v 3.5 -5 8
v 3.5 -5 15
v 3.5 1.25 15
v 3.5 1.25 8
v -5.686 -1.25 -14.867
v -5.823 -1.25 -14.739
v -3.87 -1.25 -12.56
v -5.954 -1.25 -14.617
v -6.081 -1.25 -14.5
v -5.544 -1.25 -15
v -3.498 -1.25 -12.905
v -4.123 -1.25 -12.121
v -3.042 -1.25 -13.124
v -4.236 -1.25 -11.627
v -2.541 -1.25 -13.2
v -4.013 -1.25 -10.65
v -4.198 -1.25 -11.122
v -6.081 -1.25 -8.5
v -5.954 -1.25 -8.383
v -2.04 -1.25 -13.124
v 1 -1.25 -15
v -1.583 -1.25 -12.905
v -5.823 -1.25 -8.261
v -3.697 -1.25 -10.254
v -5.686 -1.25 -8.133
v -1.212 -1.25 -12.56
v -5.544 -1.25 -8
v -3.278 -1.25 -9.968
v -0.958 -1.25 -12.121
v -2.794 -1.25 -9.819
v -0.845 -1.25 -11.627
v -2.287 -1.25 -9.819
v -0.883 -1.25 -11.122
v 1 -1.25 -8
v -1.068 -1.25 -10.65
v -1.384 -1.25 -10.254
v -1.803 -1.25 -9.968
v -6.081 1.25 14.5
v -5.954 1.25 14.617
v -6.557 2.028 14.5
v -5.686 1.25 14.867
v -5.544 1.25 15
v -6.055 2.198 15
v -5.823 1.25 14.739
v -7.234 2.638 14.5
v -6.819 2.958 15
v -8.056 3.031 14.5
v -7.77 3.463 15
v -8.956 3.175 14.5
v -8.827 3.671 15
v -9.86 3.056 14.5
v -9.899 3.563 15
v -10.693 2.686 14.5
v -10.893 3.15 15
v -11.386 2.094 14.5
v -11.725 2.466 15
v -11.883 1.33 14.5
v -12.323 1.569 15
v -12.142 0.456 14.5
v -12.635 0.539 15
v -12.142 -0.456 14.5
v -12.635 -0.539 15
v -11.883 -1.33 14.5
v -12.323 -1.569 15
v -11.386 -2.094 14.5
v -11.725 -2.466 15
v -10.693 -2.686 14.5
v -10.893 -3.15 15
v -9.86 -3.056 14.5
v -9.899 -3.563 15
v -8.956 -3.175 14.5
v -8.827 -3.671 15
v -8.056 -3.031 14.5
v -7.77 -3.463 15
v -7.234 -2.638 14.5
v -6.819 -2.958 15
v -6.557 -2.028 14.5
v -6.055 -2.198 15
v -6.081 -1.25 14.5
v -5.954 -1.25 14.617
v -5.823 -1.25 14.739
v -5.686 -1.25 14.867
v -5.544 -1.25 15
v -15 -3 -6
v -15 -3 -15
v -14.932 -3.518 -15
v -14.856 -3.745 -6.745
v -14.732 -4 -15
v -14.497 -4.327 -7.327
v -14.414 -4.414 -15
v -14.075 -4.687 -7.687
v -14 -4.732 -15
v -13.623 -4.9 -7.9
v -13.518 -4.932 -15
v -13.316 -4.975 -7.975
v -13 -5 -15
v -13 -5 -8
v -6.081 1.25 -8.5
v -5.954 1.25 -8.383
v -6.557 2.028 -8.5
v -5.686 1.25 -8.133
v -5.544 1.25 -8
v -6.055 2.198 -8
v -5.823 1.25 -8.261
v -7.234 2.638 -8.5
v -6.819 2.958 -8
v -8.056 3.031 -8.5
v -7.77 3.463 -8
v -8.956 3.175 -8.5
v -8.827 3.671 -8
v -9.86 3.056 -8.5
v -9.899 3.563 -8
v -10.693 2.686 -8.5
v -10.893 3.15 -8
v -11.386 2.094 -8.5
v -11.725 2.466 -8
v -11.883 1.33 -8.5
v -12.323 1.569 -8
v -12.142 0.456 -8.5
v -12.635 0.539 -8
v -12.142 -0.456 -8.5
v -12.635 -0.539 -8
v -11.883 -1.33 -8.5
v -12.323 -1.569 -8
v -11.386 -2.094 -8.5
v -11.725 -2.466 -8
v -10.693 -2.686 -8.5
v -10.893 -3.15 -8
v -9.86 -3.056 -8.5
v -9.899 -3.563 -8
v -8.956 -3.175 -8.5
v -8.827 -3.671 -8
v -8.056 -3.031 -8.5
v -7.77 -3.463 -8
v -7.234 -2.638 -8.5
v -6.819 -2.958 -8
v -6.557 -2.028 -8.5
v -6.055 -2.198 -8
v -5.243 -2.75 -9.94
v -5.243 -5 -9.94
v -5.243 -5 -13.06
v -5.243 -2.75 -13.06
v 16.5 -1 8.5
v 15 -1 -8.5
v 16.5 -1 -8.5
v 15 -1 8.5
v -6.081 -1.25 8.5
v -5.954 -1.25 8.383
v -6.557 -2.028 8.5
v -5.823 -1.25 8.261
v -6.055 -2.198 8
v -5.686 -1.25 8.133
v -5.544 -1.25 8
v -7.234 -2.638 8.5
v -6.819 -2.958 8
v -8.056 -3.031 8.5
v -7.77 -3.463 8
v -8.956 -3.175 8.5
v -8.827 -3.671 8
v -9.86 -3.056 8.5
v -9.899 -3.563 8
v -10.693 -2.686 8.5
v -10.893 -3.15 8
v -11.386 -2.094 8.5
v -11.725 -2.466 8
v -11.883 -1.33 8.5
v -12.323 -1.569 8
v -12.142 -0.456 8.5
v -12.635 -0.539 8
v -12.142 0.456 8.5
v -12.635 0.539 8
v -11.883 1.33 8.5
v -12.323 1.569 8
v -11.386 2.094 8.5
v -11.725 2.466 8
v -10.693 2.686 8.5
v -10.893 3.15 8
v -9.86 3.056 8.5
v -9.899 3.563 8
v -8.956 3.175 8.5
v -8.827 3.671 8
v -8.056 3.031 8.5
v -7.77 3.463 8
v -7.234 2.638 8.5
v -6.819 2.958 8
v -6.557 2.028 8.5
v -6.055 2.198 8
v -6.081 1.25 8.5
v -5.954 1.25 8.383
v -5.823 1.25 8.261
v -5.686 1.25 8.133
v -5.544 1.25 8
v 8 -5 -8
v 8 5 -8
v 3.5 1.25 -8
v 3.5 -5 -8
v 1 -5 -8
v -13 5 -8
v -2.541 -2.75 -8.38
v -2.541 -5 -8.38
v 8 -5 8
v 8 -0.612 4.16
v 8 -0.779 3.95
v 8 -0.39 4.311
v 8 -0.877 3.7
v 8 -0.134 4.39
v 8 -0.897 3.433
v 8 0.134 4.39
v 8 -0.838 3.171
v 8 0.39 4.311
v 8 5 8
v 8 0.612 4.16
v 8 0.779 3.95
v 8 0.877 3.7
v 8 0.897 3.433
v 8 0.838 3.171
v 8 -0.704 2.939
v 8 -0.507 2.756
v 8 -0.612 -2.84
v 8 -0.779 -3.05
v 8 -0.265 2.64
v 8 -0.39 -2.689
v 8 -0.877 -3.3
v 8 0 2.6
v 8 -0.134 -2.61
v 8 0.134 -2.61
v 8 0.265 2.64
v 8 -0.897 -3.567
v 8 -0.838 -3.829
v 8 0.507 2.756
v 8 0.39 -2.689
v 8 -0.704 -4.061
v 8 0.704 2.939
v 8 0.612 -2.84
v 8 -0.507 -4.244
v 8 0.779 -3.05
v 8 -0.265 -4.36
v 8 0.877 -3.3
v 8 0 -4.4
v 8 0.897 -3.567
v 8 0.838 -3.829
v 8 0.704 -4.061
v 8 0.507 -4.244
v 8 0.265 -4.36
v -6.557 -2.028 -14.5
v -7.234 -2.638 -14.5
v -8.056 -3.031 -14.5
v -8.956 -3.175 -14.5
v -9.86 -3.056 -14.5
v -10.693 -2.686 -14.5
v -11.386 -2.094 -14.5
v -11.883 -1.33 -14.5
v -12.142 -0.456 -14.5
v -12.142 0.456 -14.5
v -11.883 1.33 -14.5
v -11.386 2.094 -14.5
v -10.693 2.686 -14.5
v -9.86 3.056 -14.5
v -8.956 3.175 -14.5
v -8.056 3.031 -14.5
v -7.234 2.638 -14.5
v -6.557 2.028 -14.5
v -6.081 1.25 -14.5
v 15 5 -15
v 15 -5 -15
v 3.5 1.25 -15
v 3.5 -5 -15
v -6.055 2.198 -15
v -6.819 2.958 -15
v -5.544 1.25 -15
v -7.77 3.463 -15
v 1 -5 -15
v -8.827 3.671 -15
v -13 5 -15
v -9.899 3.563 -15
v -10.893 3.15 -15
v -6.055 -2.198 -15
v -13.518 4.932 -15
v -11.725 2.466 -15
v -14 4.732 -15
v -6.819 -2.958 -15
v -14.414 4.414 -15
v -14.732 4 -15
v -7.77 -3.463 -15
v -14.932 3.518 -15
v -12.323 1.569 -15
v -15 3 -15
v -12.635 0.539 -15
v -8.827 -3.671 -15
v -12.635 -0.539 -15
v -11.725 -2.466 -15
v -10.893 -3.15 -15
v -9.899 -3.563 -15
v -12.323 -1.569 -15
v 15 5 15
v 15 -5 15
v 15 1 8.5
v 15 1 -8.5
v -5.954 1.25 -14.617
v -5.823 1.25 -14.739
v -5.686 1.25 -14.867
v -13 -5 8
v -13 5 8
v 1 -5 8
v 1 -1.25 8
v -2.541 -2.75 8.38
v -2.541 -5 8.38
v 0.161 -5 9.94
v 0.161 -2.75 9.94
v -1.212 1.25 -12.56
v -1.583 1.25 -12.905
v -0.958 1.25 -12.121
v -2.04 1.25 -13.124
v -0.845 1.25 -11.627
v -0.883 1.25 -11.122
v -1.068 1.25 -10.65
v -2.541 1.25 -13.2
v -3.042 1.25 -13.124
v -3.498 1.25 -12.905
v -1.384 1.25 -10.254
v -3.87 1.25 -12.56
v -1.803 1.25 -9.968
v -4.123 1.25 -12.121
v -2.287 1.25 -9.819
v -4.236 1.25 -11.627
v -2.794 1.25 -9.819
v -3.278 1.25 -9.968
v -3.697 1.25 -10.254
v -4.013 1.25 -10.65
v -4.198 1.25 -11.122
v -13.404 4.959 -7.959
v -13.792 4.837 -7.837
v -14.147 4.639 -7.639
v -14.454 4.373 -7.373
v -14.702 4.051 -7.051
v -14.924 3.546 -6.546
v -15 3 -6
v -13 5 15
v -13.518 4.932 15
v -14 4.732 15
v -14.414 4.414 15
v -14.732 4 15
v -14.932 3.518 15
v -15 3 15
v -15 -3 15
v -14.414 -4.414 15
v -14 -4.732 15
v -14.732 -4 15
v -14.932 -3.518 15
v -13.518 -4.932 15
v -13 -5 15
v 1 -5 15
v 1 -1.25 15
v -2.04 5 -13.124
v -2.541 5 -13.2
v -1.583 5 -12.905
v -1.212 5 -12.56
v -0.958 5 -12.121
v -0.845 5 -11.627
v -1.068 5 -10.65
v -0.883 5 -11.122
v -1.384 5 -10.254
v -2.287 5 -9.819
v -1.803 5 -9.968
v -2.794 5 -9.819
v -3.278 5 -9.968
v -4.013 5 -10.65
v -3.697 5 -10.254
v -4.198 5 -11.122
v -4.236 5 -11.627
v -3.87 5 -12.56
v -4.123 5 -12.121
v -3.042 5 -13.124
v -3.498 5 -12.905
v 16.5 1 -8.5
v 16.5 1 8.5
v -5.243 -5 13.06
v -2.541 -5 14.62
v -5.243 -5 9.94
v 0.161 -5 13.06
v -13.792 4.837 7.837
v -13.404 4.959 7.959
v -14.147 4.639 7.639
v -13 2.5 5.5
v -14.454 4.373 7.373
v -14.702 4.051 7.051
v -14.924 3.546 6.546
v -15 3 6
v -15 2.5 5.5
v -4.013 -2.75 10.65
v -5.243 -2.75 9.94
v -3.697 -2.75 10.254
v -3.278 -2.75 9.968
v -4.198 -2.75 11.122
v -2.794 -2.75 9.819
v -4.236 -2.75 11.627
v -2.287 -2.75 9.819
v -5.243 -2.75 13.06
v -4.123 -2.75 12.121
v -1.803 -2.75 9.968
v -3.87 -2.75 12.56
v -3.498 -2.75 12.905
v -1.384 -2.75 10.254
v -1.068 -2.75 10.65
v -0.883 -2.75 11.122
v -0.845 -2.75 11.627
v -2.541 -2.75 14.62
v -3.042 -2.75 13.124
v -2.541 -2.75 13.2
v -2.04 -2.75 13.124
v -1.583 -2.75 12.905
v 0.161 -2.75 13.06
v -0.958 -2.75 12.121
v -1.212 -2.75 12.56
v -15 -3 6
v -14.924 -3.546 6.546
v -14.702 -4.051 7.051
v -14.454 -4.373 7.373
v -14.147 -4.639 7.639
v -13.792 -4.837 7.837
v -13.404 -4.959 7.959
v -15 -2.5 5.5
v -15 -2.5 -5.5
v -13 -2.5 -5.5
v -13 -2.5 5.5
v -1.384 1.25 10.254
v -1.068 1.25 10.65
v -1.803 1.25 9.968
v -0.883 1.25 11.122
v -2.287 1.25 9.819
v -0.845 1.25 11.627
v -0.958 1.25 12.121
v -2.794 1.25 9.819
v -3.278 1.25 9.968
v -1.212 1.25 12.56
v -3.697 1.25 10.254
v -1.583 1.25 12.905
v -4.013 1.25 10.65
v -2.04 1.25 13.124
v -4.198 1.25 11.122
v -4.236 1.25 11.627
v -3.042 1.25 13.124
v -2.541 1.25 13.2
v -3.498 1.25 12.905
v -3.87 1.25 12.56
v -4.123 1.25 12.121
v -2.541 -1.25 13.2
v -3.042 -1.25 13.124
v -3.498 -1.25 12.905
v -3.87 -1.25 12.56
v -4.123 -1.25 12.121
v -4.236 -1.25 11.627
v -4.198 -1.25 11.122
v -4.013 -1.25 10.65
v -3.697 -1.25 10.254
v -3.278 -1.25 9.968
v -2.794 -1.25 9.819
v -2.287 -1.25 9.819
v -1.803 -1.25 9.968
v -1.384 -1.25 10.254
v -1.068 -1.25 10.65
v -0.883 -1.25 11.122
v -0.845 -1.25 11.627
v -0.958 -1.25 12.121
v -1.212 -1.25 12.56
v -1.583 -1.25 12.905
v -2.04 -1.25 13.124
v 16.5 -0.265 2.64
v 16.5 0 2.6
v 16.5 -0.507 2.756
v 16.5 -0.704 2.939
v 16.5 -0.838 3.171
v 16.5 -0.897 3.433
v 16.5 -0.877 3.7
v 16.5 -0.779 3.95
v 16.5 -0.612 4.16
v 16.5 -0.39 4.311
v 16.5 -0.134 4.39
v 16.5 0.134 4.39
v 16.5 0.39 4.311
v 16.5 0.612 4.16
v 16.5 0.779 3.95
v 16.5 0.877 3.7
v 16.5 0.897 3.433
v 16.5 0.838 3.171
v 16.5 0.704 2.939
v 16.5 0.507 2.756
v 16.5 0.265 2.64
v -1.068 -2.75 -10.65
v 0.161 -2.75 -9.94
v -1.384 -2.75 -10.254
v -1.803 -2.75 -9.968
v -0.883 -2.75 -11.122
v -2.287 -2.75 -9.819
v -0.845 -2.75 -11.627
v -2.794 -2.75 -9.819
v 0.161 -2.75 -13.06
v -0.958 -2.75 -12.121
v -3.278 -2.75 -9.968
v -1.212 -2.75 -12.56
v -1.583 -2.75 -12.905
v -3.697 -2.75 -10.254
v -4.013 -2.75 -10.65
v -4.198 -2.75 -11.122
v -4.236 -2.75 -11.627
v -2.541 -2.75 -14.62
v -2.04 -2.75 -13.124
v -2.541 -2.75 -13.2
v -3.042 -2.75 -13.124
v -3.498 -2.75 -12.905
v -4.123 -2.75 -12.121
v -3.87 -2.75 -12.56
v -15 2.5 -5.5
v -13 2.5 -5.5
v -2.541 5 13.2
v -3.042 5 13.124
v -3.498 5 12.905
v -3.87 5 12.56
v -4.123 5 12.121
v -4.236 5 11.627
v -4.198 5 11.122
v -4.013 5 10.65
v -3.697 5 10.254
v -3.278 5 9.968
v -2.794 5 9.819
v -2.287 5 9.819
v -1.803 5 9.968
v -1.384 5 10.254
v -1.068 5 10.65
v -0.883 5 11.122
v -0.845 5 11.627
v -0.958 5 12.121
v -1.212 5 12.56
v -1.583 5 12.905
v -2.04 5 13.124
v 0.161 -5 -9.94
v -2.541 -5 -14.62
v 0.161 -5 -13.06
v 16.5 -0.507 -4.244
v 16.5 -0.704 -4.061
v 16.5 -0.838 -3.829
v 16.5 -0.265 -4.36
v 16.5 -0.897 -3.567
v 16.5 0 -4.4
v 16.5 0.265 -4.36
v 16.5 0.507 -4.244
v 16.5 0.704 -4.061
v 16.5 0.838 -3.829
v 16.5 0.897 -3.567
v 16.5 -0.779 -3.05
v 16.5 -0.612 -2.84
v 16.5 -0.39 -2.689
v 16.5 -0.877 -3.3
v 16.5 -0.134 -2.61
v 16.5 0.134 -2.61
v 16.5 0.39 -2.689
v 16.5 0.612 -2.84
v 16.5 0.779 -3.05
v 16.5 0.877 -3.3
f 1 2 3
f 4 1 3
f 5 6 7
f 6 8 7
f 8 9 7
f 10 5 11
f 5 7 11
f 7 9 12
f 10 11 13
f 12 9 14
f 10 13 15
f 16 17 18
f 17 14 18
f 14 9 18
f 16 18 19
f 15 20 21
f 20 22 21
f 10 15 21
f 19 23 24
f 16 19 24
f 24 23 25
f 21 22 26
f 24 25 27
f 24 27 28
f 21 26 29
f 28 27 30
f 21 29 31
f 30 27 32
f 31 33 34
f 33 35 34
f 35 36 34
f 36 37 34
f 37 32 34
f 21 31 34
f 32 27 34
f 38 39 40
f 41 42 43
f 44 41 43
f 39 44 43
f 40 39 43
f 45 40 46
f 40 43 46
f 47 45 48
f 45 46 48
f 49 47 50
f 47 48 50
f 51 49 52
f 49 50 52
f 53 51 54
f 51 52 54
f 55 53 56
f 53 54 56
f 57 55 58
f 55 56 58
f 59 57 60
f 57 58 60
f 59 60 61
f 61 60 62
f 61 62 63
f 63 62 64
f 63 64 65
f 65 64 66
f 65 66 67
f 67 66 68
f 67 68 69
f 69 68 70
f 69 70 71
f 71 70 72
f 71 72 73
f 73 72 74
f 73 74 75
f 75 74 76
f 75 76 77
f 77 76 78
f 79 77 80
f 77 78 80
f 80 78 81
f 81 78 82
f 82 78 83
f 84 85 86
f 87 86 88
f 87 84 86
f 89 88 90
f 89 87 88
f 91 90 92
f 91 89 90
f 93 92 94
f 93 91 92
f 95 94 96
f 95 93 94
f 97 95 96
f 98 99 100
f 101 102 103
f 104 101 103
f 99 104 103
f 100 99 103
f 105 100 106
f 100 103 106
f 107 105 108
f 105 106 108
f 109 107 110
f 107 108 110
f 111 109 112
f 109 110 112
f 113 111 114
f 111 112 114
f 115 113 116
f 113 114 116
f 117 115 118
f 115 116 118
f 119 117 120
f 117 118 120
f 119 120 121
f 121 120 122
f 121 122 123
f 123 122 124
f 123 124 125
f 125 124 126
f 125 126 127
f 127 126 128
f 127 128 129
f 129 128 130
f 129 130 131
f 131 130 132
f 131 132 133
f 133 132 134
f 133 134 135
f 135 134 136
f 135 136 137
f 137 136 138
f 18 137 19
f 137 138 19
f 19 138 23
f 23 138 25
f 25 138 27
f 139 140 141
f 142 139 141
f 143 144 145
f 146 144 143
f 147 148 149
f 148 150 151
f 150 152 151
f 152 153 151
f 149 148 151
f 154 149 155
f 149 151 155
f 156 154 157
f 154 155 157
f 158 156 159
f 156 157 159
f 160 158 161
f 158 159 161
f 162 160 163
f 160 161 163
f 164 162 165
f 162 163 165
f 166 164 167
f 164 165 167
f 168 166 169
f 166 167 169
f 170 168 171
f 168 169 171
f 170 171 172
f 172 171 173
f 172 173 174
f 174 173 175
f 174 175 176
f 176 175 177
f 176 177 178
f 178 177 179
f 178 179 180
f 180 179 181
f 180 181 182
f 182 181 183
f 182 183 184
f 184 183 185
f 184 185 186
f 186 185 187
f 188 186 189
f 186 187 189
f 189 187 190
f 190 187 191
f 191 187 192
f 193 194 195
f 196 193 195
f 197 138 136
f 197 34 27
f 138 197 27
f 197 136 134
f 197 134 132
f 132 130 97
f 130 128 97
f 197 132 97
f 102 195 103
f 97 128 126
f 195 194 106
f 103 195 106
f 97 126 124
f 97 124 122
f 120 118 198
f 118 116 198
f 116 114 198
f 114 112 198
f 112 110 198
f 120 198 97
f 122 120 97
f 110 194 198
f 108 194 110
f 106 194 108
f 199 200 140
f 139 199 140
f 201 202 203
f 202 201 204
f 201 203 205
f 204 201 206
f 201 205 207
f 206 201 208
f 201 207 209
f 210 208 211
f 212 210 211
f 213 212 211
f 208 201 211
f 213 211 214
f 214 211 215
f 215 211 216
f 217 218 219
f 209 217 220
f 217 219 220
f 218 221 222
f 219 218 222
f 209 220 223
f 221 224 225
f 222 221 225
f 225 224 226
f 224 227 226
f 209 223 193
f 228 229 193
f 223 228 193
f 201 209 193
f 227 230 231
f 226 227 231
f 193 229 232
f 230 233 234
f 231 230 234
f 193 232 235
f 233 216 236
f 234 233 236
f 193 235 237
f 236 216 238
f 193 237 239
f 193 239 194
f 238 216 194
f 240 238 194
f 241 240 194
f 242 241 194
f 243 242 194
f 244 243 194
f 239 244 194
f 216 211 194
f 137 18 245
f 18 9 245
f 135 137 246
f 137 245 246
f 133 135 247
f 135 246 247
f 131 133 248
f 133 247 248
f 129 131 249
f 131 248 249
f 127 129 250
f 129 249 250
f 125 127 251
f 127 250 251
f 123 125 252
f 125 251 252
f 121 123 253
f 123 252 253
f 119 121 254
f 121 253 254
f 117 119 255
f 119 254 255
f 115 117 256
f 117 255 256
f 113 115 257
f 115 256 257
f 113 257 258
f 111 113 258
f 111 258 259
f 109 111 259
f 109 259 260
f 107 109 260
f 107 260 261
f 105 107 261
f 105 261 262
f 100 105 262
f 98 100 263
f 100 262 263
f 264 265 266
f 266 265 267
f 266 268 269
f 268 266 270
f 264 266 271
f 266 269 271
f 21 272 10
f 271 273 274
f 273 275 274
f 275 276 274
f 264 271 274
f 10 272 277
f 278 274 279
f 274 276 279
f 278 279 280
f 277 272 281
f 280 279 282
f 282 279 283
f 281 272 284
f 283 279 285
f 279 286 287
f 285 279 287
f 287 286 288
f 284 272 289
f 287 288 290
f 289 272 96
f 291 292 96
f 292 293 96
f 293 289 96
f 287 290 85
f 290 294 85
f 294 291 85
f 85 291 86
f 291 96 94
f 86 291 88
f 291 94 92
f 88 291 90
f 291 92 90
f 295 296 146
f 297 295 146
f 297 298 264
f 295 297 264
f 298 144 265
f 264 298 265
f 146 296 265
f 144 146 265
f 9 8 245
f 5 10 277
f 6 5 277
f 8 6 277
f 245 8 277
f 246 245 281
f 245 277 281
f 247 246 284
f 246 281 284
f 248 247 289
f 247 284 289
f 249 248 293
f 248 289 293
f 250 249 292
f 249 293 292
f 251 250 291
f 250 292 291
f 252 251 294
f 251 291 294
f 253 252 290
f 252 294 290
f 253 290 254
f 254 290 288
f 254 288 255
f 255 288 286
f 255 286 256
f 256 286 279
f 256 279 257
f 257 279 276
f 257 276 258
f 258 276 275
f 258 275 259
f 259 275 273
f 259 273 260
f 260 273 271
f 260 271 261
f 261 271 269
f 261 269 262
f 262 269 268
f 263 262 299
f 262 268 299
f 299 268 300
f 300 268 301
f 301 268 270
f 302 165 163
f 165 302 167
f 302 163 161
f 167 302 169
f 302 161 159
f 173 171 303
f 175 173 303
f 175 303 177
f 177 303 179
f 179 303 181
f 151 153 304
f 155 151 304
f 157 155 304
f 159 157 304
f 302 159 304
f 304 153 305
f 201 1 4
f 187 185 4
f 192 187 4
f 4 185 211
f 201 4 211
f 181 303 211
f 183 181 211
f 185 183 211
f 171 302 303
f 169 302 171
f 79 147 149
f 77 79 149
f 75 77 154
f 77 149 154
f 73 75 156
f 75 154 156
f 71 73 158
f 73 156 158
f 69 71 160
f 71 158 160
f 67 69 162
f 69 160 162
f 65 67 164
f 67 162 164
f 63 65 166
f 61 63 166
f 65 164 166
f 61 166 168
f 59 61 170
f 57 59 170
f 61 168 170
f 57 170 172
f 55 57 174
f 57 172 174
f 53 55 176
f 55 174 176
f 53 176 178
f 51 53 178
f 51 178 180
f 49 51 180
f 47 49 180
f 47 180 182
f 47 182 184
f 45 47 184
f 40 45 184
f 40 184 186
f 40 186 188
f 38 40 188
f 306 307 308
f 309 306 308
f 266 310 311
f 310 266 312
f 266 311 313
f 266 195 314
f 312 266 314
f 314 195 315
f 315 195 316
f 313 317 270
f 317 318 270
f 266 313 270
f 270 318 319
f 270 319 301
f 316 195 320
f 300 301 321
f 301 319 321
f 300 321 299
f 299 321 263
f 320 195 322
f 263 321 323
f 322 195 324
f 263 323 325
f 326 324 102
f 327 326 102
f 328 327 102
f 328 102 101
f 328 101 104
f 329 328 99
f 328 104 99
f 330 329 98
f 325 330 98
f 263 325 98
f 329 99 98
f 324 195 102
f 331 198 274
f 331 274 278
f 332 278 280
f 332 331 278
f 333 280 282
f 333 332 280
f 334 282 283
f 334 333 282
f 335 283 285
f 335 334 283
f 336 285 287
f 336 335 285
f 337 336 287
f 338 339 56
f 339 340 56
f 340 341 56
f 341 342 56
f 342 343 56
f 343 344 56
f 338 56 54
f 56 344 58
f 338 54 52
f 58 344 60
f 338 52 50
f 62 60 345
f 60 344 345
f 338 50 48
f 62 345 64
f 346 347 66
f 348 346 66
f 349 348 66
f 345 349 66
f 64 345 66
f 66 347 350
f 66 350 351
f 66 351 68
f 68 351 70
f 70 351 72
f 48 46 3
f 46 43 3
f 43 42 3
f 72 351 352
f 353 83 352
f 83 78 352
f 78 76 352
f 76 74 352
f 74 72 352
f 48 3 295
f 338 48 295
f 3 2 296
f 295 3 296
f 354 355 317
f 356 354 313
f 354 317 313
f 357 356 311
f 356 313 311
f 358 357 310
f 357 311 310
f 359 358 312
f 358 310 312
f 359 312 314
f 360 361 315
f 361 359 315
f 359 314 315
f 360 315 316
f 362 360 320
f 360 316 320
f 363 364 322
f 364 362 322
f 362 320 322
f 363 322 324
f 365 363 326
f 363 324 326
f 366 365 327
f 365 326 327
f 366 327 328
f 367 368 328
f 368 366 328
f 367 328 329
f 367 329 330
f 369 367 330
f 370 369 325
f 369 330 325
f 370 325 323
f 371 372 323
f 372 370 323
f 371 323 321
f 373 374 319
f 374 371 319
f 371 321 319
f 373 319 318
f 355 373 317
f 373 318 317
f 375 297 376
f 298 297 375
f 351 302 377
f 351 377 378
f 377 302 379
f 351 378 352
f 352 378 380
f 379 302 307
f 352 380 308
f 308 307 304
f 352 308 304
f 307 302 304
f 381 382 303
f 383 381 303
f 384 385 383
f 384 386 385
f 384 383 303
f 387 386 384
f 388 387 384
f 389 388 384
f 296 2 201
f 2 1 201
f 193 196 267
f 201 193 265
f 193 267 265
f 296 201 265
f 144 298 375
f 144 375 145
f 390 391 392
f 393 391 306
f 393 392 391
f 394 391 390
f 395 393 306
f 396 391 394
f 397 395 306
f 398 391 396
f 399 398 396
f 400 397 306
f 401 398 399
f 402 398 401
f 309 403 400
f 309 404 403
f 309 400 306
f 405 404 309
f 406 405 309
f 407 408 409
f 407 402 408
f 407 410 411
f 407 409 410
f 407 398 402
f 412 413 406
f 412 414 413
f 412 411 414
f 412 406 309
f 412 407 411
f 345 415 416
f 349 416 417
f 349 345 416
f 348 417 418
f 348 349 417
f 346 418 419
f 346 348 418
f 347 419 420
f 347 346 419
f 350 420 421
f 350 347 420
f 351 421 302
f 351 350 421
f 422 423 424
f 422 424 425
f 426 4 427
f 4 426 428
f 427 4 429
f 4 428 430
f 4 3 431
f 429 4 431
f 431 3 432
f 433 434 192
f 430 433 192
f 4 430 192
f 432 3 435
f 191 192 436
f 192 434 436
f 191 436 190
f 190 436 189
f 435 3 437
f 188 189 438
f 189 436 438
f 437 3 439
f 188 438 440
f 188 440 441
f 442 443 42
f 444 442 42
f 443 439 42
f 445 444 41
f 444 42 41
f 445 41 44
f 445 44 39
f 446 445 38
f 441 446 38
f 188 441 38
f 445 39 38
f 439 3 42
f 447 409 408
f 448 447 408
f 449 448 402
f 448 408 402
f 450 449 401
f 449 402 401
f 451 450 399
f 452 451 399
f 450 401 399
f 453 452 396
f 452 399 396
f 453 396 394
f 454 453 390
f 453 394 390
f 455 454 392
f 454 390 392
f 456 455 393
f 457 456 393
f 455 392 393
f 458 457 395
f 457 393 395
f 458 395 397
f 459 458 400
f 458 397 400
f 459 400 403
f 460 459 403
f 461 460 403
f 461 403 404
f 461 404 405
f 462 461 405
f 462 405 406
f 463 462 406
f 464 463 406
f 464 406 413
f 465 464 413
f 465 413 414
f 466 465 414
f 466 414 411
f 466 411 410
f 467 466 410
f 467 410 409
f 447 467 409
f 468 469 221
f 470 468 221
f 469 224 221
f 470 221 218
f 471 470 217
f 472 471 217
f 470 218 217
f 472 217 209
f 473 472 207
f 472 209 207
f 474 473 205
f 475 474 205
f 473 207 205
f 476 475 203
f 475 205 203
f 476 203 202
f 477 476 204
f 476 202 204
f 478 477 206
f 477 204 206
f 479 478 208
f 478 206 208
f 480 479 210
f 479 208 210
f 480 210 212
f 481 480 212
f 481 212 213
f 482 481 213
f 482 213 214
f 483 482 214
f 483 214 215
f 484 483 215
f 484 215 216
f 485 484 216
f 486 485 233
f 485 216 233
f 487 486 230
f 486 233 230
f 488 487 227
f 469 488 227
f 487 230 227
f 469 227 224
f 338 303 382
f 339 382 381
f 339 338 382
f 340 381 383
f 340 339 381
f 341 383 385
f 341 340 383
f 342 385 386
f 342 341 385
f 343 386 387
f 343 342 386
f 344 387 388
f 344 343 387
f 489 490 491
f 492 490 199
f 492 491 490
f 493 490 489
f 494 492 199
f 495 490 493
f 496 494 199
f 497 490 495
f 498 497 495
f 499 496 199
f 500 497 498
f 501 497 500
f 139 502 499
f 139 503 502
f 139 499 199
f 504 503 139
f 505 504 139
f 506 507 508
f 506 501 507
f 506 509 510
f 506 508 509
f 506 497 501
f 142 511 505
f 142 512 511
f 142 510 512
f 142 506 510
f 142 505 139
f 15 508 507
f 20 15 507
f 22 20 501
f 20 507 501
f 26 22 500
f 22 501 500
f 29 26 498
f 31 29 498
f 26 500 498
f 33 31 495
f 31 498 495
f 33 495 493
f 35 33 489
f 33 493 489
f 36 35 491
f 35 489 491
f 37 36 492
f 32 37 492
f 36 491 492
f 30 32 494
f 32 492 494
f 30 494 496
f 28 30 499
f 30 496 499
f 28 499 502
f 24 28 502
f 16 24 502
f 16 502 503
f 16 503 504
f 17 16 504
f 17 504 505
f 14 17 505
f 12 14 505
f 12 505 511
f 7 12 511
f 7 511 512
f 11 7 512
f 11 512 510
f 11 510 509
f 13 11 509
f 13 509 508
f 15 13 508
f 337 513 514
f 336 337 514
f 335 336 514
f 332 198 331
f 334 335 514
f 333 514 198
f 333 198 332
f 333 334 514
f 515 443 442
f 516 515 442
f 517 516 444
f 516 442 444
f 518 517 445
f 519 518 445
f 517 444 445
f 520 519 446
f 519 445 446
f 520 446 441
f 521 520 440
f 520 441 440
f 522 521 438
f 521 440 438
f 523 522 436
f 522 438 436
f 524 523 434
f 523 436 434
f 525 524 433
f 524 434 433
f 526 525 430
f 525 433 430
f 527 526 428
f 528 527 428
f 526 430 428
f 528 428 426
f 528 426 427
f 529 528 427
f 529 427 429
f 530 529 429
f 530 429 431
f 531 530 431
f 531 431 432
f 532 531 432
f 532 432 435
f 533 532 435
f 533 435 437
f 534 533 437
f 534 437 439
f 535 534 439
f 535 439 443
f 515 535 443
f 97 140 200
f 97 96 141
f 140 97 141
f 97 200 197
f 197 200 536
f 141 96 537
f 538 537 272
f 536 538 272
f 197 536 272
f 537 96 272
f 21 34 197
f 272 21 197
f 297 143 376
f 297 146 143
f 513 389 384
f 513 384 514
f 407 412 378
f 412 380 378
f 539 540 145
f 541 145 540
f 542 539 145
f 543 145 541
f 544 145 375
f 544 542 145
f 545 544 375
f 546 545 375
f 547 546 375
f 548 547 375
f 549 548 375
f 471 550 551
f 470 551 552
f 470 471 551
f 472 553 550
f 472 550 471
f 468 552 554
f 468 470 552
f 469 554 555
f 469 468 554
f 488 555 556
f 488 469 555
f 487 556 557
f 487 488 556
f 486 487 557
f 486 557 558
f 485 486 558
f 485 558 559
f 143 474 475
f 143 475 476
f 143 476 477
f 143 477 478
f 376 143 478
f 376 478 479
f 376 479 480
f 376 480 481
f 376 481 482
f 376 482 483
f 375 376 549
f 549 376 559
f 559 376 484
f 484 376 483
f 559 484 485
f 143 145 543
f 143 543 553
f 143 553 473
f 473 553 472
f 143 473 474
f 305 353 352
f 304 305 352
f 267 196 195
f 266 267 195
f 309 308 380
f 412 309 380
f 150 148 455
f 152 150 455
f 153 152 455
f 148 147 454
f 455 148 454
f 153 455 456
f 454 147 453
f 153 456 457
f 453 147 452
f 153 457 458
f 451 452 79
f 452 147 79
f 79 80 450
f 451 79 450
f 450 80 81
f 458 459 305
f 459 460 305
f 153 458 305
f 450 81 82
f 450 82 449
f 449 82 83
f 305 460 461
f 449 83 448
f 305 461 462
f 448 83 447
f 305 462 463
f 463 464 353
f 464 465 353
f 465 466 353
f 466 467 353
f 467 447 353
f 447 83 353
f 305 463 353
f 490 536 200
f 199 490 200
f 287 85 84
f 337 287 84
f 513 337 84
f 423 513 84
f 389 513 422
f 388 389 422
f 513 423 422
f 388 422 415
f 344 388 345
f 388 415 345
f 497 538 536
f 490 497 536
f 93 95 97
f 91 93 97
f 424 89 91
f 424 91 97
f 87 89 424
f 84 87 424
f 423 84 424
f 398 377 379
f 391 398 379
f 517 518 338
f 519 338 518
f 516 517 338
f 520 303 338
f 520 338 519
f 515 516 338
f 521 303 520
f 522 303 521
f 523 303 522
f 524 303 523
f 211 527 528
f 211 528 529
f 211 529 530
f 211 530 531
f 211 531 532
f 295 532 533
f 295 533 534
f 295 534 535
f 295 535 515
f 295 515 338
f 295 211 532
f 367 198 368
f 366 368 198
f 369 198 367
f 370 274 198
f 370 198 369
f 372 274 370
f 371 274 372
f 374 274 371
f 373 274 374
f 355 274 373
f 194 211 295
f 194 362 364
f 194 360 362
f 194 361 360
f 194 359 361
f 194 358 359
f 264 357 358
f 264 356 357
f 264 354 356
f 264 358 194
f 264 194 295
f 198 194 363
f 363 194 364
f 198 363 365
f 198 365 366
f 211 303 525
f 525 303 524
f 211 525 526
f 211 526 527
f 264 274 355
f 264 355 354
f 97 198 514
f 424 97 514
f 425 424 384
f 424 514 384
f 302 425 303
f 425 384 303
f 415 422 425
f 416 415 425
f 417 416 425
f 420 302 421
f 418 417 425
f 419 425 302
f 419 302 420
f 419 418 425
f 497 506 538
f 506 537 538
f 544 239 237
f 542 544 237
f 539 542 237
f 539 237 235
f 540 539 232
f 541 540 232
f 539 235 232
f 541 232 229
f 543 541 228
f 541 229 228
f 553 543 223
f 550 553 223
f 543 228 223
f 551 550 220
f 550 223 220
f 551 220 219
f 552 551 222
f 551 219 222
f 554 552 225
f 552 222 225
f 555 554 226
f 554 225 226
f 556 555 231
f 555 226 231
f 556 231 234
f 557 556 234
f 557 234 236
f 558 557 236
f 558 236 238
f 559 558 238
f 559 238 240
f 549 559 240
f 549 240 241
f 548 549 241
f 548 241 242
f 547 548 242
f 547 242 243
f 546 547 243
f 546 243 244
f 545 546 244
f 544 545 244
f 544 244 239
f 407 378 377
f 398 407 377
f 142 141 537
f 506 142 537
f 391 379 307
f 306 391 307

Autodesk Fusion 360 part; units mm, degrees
sketch "Sketch1" plane through (0, 0, 0) normal (0, 1, 0) x (1, 0, 0)
  line L0 (15, 15) -> (-15, 15)
  line L1 (-15, 15) -> (-15, -15)
  line L2 (-15, -15) -> (15, -15)
  line L3 (15, -15) -> (15, 15)
  line L4 (15, 15) -> (-15, -15) construction
  line L5 (-15, 15) -> (15, -15) construction
  dimension "d1" = 30
  dimension "d2" = 30
extrude "Extrude1" add sketch "Sketch1" along normal mid plane 10
sketch "Sketch2" plane through (0, 0, 15) normal (0, 0, 1) x (-1, 0, 0)
  line L0 (-15, 5) -> (-15, -5)
  line L1 (-15, -5) -> (15, -5)
  line L2 (15, -5) -> (15, 5)
  line L3 (15, 5) -> (-15, 5)
  point P0 (9, 0)
  dimension "d5" = 6
hole "Hole1" at (-9, 0, 15) direction (0, 0, -1) diameter 6.35 end through all
sketch "Sketch3" plane through (0, 0, 15) normal (0, 0, 1) x (-1, 0, 0)
  circle A0 centre (9, 0) radius 3.175
  line L0 (-15, 5) -> (-15, -5)
  line L1 (-15, -5) -> (15, -5)
  line L2 (15, -5) -> (15, 5)
  line L3 (15, 5) -> (-15, 5)
  line L4 (-3.5, -1.25) -> (11.5, -1.25)
  line L5 (11.5, -1.25) -> (11.5, 1.25)
  line L6 (11.5, 1.25) -> (-3.5, 1.25)
  line L7 (-3.5, 1.25) -> (-3.5, -1.25)
  line L8 (-3.5, -1.25) -> (11.5, 1.25) construction
  line L9 (11.5, -1.25) -> (-3.5, 1.25) construction
  line L10 (-3.5, 1.25) -> (-1, 1.25)
  line L11 (-1, 1.25) -> (-1, 5)
  line L12 (-3.5, 5) -> (-3.5, 1.25)
  point P0 (4, 0)
  dimension "d9" = 5
  dimension "d10" = 2.5
  dimension "d11" = 15
  dimension "d18" = 2.5
extrude "Extrude2" cut sketch "Sketch3" against normal through all contours A0 L4 L6 L7 L10 | L3 L6 L10 L11 L12
sketch "Sketch4" plane through (0, 5, 0) normal (0, 1, 0) x (-1, 0, 0)
  line L0 (-15, 15) -> (-15, -15)
  line L1 (-15, -15) -> (15, -15)
  line L2 (15, -15) -> (15, 15)
  line L3 (15, 15) -> (-15, 15)
  line L4 (-1, -15) -> (6.0814, -15)
  line L5 (6.0814, -15) -> (6.0814, 15)
  line L6 (6.0814, 15) -> (-1, 15)
  line L7 (-1, 15) -> (-1, -15)
  point P0 (2.5407, 11.5)
  point P1 (2.5407, 15)
  dimension "d14" = 3.5
hole "Hole2" at (-2.5407, 5, 11.5) direction (0, -1, 0) diameter 3.4 depth 10 tip angle 118
sketch "Sketch5" plane through (0, -5, 0) normal (0, -1, 0) x (1, 0, 0)
  circle A0 centre (-2.5407, 11.5) radius 1.7
  line L0 (1, -15) -> (1, 15)
  line L1 (1, 15) -> (-15, 15)
  line L2 (-15, 15) -> (-15, -15)
  line L3 (-15, -15) -> (1, -15)
  line L4 (0.1613, 9.94) -> (0.1613, 13.06)
  line L5 (0.1613, 13.06) -> (-2.5407, 14.62)
  line L6 (-2.5407, 14.62) -> (-5.2427, 13.06)
  line L7 (-5.2427, 13.06) -> (-5.2427, 9.94)
  line L8 (-5.2427, 9.94) -> (-2.5407, 8.38)
  line L9 (-2.5407, 8.38) -> (0.1613, 9.94)
  point P0 (-2.5407, 11.5)
  dimension "d19" = 3.12
extrude "Extrude3" cut sketch "Sketch5" against normal blind 2.25 contours L4 L5 L6 L7 L8 L9
mirror "Mirror1" about plane through (0, 0, 0) normal (0, 0, 1) of "Hole2", "Extrude3"
sketch "Sketch6" plane through (0, 5, 0) normal (0, 1, 0) x (-1, 0, 0)
  circle A0 centre (2.5407, -11.5) radius 1.7
  circle A1 centre (2.5407, 11.5) radius 1.7
  line L0 (-15, 15) -> (-15, -15)
  line L1 (-15, -15) -> (15, -15)
  line L2 (15, -15) -> (15, 15)
  line L3 (15, 15) -> (-15, 15)
  line L4 (13, 8) -> (-8, 8)
  line L5 (-8, 8) -> (-8, -8)
  line L6 (-8, -8) -> (13, -8)
  line L7 (13, -8) -> (13, 8)
  dimension "d24" = 7
  dimension "d25" = 7
  dimension "d26" = 7
  dimension "d27" = 2
extrude "Extrude4" cut sketch "Sketch6" against normal through all contours L4 L5 L6 L7
sketch "Sketch7" plane through (15, 0, 0) normal (1, 0, 0) x (0, 1, 0)
  line L0 (-5, -15) -> (5, -15)
  line L1 (5, -15) -> (5, 15)
  line L2 (5, 15) -> (-5, 15)
  line L3 (-5, 15) -> (-5, -15)
  line L4 (1, -8.5) -> (-1, -8.5)
  line L5 (-1, -8.5) -> (-1, 8.5)
  line L6 (-1, 8.5) -> (1, 8.5)
  line L7 (1, 8.5) -> (1, -8.5)
  line L8 (1, -8.5) -> (-1, 8.5) construction
  line L9 (-1, -8.5) -> (1, 8.5) construction
  dimension "d29" = 2
  dimension "d30" = 17
extrude "Extrude5" add sketch "Sketch7" along normal blind 1.5 contours L4 L5 L6 L7
sketch "Sketch8" plane through (16.5, 0, 0) normal (1, 0, 0) x (0, 1, 0)
  line L0 (1, 8.5) -> (-1, 8.5)
  line L1 (-1, 8.5) -> (-1, -8.5)
  line L2 (-1, -8.5) -> (1, -8.5)
  line L3 (1, -8.5) -> (1, 8.5)
  point P0 (0, 3.5)
  point P1 (0, -3.5)
  dimension "d33" = 3.5
  dimension "d34" = 3.5
hole "Hole3" at (16.5, 0, 3.5) at (16.5, 0, -3.5) direction (-1, 0, 0) diameter 1.8 depth 8.5 tip angle 180
sketch "Sketch9" plane through (-15, 0, 0) normal (-1, 0, 0) x (0, -1, 0)
  line L0 (5, 15) -> (-5, 15)
  line L1 (-5, 15) -> (-5, -15)
  line L2 (-5, -15) -> (5, -15)
  line L3 (5, -15) -> (5, 15)
  line L4 (-5, 8) -> (5, 8)
  line L5 (-5, 8) -> (-2.5, 5.5)
  line L6 (-2.5, 5.5) -> (-2.5, -5.5)
  line L7 (-5, -8) -> (5, -8)
  line L8 (-2.5, -5.5) -> (-5, -8)
  line L9 (-5, 8) -> (-5, -8)
  point P0 (-5, -8)
  dimension "d38" = 135
  dimension "d39" = 135
  dimension "d40" = 2.5
extrude "Extrude6" cut sketch "Sketch9" against normal up to surface (2 mm away) contours L1 L5 L6 L8 L9
chamfer "Chamfer1" distance 0.5 angle 45 4 edges at (-12.175, 0, -15) (-12.175, 0, -8) (-12.175, 0, 8) (-12.175, 0, 15)
mirror "Mirror2" about plane through (0, 0, 0) normal (0, 1, 0) of "Extrude6"
fillet "Fillet1" radius 2 1 edges at (-15, -5, 11.5)
fillet "Fillet1" radius 2 1 edges at (-15, 5, 11.5)
fillet "Fillet1" radius 2 2 edges at (-15, 5, -11.5) (-15, -5, -11.5)
